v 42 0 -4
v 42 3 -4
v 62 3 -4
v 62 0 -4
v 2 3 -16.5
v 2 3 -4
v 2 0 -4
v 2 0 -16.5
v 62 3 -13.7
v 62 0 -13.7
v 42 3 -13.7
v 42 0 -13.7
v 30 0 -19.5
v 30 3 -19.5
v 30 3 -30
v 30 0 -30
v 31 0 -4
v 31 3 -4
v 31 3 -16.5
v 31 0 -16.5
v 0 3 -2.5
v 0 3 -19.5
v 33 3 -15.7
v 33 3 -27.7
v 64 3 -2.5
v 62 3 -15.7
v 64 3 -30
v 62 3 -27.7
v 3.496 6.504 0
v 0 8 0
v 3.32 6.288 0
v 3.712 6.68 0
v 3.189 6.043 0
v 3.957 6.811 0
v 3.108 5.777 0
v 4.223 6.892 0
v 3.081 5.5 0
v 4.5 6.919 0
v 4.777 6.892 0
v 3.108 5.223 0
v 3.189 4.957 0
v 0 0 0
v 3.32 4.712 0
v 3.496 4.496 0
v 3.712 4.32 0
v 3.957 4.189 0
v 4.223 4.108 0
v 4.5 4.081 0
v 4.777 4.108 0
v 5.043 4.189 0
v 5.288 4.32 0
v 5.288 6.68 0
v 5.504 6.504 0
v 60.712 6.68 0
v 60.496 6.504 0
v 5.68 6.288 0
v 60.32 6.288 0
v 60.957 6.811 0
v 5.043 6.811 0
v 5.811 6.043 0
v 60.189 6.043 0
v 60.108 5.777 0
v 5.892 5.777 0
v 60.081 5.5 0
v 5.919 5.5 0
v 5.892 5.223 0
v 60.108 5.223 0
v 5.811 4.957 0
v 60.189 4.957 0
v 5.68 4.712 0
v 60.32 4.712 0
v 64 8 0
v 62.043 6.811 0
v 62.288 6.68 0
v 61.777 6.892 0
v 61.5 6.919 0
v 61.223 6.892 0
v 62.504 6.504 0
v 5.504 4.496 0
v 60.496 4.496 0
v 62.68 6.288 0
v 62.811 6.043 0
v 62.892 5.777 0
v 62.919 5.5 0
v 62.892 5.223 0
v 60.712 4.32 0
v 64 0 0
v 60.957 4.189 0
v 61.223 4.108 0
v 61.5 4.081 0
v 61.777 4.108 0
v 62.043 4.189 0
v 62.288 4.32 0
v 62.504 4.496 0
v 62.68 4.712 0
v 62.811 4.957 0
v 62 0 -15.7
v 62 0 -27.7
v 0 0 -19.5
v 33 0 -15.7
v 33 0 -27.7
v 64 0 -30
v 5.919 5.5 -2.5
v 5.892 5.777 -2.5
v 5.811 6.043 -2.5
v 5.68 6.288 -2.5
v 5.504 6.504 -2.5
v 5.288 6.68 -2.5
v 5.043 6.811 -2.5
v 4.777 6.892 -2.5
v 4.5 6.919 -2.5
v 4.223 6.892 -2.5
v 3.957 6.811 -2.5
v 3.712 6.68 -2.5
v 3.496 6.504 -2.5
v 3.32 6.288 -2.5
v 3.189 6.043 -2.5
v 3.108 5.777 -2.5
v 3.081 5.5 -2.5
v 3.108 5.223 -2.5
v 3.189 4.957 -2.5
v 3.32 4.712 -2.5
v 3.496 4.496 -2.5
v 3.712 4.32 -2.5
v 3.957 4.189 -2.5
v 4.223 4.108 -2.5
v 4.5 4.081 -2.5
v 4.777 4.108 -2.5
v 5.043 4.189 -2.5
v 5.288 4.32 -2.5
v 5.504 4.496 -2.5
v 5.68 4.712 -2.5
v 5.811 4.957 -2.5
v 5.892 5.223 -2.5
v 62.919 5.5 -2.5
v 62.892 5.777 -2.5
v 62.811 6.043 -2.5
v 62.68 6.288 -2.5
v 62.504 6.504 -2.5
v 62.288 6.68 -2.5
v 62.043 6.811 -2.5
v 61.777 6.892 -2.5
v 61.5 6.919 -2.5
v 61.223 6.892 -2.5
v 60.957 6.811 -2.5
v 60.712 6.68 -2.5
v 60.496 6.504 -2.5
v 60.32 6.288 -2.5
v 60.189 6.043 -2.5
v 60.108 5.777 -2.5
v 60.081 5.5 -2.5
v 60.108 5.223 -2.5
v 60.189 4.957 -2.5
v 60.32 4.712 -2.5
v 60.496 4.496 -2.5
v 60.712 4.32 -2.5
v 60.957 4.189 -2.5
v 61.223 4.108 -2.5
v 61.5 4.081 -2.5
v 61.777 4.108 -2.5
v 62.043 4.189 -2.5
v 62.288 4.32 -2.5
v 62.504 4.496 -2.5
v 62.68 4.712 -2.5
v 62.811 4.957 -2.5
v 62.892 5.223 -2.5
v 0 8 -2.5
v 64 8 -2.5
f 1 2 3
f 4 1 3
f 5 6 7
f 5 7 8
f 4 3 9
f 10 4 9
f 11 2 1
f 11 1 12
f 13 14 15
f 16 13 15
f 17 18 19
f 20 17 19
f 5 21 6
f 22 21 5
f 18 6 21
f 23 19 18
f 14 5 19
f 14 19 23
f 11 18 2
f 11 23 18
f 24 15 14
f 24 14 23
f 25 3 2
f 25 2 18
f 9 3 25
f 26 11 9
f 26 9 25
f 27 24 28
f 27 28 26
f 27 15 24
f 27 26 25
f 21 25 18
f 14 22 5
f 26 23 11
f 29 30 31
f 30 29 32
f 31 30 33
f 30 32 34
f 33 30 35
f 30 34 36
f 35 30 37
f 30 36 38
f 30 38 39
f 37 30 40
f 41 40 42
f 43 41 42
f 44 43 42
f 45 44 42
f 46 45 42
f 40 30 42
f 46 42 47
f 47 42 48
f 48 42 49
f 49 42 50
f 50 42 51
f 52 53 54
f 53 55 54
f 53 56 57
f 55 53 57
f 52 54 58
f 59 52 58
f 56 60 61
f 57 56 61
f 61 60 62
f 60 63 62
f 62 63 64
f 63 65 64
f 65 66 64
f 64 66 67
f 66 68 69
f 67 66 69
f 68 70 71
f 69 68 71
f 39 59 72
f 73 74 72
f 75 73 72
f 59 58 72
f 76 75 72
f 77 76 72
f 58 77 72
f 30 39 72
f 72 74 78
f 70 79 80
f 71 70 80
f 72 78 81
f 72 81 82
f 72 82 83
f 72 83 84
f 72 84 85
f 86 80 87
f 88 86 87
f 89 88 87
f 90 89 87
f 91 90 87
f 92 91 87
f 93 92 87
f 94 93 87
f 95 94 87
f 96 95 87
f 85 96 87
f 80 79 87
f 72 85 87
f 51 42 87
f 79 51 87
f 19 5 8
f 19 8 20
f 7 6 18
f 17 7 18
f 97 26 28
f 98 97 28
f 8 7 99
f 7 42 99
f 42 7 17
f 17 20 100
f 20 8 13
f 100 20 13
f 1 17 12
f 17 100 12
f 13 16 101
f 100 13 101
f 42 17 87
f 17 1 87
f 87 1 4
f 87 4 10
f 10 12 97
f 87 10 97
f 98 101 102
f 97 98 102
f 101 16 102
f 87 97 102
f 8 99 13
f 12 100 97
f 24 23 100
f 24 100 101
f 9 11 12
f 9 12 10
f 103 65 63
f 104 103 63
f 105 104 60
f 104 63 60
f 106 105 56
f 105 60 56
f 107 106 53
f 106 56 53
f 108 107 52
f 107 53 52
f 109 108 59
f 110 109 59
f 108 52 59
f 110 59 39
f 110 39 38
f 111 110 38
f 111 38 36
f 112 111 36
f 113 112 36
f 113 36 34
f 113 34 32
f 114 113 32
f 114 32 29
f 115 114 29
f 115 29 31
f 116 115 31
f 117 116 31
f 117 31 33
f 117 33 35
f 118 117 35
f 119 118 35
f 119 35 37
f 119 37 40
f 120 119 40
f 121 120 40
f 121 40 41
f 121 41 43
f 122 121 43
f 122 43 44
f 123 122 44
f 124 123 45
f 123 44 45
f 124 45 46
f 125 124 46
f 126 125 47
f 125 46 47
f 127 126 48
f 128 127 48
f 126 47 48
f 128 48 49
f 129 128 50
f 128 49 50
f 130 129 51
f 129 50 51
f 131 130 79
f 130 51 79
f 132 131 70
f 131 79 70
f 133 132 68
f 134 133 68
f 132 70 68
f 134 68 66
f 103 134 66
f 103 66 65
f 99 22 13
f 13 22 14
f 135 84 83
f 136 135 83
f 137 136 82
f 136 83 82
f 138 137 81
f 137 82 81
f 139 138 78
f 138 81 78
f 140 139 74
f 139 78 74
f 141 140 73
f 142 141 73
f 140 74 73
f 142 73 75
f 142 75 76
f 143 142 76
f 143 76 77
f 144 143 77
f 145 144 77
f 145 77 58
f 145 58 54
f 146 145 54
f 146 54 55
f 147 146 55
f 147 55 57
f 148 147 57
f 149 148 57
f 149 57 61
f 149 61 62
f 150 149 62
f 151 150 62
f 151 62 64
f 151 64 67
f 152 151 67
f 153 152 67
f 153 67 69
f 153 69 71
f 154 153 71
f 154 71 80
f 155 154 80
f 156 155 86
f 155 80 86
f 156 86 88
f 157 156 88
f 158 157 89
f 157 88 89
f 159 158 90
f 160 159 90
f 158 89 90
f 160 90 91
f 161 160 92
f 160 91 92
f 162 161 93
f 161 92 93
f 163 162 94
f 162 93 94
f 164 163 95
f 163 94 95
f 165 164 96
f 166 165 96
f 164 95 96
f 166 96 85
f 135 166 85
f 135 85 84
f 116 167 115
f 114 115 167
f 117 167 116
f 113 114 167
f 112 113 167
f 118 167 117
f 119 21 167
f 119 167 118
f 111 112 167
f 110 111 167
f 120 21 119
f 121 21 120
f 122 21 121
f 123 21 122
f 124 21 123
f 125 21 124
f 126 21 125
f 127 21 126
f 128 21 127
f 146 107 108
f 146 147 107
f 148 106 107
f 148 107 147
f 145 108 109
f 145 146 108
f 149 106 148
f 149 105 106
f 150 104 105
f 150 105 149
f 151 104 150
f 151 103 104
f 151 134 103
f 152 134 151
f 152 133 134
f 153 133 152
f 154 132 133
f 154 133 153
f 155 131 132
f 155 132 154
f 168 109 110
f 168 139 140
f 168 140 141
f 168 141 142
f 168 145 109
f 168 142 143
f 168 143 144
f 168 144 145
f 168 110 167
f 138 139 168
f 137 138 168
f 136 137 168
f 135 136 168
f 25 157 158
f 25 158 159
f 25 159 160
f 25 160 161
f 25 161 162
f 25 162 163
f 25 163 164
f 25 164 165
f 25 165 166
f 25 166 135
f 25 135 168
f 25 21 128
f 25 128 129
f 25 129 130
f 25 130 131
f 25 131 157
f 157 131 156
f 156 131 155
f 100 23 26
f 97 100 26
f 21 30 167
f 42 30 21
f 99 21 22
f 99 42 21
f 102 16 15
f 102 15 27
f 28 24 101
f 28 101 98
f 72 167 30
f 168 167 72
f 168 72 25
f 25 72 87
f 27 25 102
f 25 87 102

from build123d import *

# Parameters (mm, degrees)
SKETCH1_W           = 64
SKETCH1_H           = 30
BOSS_EXTRUDE1_DEPTH = 3
CUT_EXTRUDE1_REACH  = 72.746
SKETCH2_W           = 29
SKETCH2_H           = 12.5
SKETCH2_H_2         = 12
SKETCH2_W_2         = 20
SKETCH2_H_3         = 9.7
SKETCH2_W_3         = 30
SKETCH2_H_4         = 10.5
SKETCH3_W           = 64
SKETCH3_H           = 2.5
BOSS_EXTRUDE3_DEPTH = 5
CUT_EXTRUDE2_REACH  = 73.134
SKETCH4_R           = 1.419176597


with BuildPart() as part:
    # Sketch1 → Boss-Extrude1 (new body)
    with BuildSketch(Plane(origin=(0, 0, 0), x_dir=(1, 0, 0), z_dir=(0, 1, 0))):
        with Locations((32, 15)):
            Rectangle(SKETCH1_W, SKETCH1_H)
    extrude(amount=BOSS_EXTRUDE1_DEPTH)

    # Sketch2 → Cut-Extrude1 (cut, up to next)
    with BuildSketch(Plane(origin=(0, 3, 0), x_dir=(1, 0, 0), z_dir=(0, 1, 0)), mode=Mode.PRIVATE) as cut_extrude1_sk1:
        with Locations((16.5, 10.25)):
            Rectangle(SKETCH2_W, SKETCH2_H)
    cut_extrude1_tool1 = extrude(cut_extrude1_sk1.sketch, amount=-CUT_EXTRUDE1_REACH, mode=Mode.PRIVATE) & part.part
    # Sketch2 → Cut-Extrude1 (cut, up to next)
    with BuildSketch(Plane(origin=(0, 3, 0), x_dir=(1, 0, 0), z_dir=(0, 1, 0)), mode=Mode.PRIVATE) as cut_extrude1_sk2:
        with Locations((47.5, 21.7)):
            Rectangle(SKETCH2_W, SKETCH2_H_2)
    cut_extrude1_tool2 = extrude(cut_extrude1_sk2.sketch, amount=-CUT_EXTRUDE1_REACH, mode=Mode.PRIVATE) & part.part
    # Sketch2 → Cut-Extrude1 (cut, up to next)
    with BuildSketch(Plane(origin=(0, 3, 0), x_dir=(1, 0, 0), z_dir=(0, 1, 0)), mode=Mode.PRIVATE) as cut_extrude1_sk3:
        with Locations((52, 8.85)):
            Rectangle(SKETCH2_W_2, SKETCH2_H_3)
    cut_extrude1_tool3 = extrude(cut_extrude1_sk3.sketch, amount=-CUT_EXTRUDE1_REACH, mode=Mode.PRIVATE) & part.part
    # Sketch2 → Cut-Extrude1 (cut, up to next)
    with BuildSketch(Plane(origin=(0, 3, 0), x_dir=(1, 0, 0), z_dir=(0, 1, 0)), mode=Mode.PRIVATE) as cut_extrude1_sk4:
        with Locations((15, 24.75)):
            Rectangle(SKETCH2_W_3, SKETCH2_H_4)
    cut_extrude1_tool4 = extrude(cut_extrude1_sk4.sketch, amount=-CUT_EXTRUDE1_REACH, mode=Mode.PRIVATE) & part.part
    add(cut_extrude1_tool1.solids().sort_by_distance((16.5, 3, -10.25))[0], mode=Mode.SUBTRACT)
    add(cut_extrude1_tool2.solids().sort_by_distance((47.5, 3, -21.7))[0], mode=Mode.SUBTRACT)
    add(cut_extrude1_tool3.solids().sort_by_distance((52, 3, -8.85))[0], mode=Mode.SUBTRACT)
    add(cut_extrude1_tool4.solids().sort_by_distance((15, 3, -24.75))[0], mode=Mode.SUBTRACT)

    # Sketch3 → Boss-Extrude3 (add)
    with BuildSketch(Plane(origin=(0, 3, 0), x_dir=(1, 0, 0), z_dir=(0, 1, 0))):
        with Locations((32, 1.25)):
            Rectangle(SKETCH3_W, SKETCH3_H)
    extrude(amount=BOSS_EXTRUDE3_DEPTH)

    # Sketch4 → Cut-Extrude2 (cut, up to next)
    with BuildSketch(Plane.XY, mode=Mode.PRIVATE) as cut_extrude2_sk1:
        with Locations((61.5, 5.5)):
            Circle(SKETCH4_R)
    cut_extrude2_tool1 = extrude(cut_extrude2_sk1.sketch, amount=-CUT_EXTRUDE2_REACH, mode=Mode.PRIVATE) & part.part
    # Sketch4 → Cut-Extrude2 (cut, up to next)
    with BuildSketch(Plane.XY, mode=Mode.PRIVATE) as cut_extrude2_sk2:
        with Locations((4.5, 5.5)):
            Circle(SKETCH4_R)
    cut_extrude2_tool2 = extrude(cut_extrude2_sk2.sketch, amount=-CUT_EXTRUDE2_REACH, mode=Mode.PRIVATE) & part.part
    add(cut_extrude2_tool1.solids().sort_by_distance((61.5, 5.5, 0))[0], mode=Mode.SUBTRACT)
    add(cut_extrude2_tool2.solids().sort_by_distance((4.5, 5.5, 0))[0], mode=Mode.SUBTRACT)


solid = part.part
